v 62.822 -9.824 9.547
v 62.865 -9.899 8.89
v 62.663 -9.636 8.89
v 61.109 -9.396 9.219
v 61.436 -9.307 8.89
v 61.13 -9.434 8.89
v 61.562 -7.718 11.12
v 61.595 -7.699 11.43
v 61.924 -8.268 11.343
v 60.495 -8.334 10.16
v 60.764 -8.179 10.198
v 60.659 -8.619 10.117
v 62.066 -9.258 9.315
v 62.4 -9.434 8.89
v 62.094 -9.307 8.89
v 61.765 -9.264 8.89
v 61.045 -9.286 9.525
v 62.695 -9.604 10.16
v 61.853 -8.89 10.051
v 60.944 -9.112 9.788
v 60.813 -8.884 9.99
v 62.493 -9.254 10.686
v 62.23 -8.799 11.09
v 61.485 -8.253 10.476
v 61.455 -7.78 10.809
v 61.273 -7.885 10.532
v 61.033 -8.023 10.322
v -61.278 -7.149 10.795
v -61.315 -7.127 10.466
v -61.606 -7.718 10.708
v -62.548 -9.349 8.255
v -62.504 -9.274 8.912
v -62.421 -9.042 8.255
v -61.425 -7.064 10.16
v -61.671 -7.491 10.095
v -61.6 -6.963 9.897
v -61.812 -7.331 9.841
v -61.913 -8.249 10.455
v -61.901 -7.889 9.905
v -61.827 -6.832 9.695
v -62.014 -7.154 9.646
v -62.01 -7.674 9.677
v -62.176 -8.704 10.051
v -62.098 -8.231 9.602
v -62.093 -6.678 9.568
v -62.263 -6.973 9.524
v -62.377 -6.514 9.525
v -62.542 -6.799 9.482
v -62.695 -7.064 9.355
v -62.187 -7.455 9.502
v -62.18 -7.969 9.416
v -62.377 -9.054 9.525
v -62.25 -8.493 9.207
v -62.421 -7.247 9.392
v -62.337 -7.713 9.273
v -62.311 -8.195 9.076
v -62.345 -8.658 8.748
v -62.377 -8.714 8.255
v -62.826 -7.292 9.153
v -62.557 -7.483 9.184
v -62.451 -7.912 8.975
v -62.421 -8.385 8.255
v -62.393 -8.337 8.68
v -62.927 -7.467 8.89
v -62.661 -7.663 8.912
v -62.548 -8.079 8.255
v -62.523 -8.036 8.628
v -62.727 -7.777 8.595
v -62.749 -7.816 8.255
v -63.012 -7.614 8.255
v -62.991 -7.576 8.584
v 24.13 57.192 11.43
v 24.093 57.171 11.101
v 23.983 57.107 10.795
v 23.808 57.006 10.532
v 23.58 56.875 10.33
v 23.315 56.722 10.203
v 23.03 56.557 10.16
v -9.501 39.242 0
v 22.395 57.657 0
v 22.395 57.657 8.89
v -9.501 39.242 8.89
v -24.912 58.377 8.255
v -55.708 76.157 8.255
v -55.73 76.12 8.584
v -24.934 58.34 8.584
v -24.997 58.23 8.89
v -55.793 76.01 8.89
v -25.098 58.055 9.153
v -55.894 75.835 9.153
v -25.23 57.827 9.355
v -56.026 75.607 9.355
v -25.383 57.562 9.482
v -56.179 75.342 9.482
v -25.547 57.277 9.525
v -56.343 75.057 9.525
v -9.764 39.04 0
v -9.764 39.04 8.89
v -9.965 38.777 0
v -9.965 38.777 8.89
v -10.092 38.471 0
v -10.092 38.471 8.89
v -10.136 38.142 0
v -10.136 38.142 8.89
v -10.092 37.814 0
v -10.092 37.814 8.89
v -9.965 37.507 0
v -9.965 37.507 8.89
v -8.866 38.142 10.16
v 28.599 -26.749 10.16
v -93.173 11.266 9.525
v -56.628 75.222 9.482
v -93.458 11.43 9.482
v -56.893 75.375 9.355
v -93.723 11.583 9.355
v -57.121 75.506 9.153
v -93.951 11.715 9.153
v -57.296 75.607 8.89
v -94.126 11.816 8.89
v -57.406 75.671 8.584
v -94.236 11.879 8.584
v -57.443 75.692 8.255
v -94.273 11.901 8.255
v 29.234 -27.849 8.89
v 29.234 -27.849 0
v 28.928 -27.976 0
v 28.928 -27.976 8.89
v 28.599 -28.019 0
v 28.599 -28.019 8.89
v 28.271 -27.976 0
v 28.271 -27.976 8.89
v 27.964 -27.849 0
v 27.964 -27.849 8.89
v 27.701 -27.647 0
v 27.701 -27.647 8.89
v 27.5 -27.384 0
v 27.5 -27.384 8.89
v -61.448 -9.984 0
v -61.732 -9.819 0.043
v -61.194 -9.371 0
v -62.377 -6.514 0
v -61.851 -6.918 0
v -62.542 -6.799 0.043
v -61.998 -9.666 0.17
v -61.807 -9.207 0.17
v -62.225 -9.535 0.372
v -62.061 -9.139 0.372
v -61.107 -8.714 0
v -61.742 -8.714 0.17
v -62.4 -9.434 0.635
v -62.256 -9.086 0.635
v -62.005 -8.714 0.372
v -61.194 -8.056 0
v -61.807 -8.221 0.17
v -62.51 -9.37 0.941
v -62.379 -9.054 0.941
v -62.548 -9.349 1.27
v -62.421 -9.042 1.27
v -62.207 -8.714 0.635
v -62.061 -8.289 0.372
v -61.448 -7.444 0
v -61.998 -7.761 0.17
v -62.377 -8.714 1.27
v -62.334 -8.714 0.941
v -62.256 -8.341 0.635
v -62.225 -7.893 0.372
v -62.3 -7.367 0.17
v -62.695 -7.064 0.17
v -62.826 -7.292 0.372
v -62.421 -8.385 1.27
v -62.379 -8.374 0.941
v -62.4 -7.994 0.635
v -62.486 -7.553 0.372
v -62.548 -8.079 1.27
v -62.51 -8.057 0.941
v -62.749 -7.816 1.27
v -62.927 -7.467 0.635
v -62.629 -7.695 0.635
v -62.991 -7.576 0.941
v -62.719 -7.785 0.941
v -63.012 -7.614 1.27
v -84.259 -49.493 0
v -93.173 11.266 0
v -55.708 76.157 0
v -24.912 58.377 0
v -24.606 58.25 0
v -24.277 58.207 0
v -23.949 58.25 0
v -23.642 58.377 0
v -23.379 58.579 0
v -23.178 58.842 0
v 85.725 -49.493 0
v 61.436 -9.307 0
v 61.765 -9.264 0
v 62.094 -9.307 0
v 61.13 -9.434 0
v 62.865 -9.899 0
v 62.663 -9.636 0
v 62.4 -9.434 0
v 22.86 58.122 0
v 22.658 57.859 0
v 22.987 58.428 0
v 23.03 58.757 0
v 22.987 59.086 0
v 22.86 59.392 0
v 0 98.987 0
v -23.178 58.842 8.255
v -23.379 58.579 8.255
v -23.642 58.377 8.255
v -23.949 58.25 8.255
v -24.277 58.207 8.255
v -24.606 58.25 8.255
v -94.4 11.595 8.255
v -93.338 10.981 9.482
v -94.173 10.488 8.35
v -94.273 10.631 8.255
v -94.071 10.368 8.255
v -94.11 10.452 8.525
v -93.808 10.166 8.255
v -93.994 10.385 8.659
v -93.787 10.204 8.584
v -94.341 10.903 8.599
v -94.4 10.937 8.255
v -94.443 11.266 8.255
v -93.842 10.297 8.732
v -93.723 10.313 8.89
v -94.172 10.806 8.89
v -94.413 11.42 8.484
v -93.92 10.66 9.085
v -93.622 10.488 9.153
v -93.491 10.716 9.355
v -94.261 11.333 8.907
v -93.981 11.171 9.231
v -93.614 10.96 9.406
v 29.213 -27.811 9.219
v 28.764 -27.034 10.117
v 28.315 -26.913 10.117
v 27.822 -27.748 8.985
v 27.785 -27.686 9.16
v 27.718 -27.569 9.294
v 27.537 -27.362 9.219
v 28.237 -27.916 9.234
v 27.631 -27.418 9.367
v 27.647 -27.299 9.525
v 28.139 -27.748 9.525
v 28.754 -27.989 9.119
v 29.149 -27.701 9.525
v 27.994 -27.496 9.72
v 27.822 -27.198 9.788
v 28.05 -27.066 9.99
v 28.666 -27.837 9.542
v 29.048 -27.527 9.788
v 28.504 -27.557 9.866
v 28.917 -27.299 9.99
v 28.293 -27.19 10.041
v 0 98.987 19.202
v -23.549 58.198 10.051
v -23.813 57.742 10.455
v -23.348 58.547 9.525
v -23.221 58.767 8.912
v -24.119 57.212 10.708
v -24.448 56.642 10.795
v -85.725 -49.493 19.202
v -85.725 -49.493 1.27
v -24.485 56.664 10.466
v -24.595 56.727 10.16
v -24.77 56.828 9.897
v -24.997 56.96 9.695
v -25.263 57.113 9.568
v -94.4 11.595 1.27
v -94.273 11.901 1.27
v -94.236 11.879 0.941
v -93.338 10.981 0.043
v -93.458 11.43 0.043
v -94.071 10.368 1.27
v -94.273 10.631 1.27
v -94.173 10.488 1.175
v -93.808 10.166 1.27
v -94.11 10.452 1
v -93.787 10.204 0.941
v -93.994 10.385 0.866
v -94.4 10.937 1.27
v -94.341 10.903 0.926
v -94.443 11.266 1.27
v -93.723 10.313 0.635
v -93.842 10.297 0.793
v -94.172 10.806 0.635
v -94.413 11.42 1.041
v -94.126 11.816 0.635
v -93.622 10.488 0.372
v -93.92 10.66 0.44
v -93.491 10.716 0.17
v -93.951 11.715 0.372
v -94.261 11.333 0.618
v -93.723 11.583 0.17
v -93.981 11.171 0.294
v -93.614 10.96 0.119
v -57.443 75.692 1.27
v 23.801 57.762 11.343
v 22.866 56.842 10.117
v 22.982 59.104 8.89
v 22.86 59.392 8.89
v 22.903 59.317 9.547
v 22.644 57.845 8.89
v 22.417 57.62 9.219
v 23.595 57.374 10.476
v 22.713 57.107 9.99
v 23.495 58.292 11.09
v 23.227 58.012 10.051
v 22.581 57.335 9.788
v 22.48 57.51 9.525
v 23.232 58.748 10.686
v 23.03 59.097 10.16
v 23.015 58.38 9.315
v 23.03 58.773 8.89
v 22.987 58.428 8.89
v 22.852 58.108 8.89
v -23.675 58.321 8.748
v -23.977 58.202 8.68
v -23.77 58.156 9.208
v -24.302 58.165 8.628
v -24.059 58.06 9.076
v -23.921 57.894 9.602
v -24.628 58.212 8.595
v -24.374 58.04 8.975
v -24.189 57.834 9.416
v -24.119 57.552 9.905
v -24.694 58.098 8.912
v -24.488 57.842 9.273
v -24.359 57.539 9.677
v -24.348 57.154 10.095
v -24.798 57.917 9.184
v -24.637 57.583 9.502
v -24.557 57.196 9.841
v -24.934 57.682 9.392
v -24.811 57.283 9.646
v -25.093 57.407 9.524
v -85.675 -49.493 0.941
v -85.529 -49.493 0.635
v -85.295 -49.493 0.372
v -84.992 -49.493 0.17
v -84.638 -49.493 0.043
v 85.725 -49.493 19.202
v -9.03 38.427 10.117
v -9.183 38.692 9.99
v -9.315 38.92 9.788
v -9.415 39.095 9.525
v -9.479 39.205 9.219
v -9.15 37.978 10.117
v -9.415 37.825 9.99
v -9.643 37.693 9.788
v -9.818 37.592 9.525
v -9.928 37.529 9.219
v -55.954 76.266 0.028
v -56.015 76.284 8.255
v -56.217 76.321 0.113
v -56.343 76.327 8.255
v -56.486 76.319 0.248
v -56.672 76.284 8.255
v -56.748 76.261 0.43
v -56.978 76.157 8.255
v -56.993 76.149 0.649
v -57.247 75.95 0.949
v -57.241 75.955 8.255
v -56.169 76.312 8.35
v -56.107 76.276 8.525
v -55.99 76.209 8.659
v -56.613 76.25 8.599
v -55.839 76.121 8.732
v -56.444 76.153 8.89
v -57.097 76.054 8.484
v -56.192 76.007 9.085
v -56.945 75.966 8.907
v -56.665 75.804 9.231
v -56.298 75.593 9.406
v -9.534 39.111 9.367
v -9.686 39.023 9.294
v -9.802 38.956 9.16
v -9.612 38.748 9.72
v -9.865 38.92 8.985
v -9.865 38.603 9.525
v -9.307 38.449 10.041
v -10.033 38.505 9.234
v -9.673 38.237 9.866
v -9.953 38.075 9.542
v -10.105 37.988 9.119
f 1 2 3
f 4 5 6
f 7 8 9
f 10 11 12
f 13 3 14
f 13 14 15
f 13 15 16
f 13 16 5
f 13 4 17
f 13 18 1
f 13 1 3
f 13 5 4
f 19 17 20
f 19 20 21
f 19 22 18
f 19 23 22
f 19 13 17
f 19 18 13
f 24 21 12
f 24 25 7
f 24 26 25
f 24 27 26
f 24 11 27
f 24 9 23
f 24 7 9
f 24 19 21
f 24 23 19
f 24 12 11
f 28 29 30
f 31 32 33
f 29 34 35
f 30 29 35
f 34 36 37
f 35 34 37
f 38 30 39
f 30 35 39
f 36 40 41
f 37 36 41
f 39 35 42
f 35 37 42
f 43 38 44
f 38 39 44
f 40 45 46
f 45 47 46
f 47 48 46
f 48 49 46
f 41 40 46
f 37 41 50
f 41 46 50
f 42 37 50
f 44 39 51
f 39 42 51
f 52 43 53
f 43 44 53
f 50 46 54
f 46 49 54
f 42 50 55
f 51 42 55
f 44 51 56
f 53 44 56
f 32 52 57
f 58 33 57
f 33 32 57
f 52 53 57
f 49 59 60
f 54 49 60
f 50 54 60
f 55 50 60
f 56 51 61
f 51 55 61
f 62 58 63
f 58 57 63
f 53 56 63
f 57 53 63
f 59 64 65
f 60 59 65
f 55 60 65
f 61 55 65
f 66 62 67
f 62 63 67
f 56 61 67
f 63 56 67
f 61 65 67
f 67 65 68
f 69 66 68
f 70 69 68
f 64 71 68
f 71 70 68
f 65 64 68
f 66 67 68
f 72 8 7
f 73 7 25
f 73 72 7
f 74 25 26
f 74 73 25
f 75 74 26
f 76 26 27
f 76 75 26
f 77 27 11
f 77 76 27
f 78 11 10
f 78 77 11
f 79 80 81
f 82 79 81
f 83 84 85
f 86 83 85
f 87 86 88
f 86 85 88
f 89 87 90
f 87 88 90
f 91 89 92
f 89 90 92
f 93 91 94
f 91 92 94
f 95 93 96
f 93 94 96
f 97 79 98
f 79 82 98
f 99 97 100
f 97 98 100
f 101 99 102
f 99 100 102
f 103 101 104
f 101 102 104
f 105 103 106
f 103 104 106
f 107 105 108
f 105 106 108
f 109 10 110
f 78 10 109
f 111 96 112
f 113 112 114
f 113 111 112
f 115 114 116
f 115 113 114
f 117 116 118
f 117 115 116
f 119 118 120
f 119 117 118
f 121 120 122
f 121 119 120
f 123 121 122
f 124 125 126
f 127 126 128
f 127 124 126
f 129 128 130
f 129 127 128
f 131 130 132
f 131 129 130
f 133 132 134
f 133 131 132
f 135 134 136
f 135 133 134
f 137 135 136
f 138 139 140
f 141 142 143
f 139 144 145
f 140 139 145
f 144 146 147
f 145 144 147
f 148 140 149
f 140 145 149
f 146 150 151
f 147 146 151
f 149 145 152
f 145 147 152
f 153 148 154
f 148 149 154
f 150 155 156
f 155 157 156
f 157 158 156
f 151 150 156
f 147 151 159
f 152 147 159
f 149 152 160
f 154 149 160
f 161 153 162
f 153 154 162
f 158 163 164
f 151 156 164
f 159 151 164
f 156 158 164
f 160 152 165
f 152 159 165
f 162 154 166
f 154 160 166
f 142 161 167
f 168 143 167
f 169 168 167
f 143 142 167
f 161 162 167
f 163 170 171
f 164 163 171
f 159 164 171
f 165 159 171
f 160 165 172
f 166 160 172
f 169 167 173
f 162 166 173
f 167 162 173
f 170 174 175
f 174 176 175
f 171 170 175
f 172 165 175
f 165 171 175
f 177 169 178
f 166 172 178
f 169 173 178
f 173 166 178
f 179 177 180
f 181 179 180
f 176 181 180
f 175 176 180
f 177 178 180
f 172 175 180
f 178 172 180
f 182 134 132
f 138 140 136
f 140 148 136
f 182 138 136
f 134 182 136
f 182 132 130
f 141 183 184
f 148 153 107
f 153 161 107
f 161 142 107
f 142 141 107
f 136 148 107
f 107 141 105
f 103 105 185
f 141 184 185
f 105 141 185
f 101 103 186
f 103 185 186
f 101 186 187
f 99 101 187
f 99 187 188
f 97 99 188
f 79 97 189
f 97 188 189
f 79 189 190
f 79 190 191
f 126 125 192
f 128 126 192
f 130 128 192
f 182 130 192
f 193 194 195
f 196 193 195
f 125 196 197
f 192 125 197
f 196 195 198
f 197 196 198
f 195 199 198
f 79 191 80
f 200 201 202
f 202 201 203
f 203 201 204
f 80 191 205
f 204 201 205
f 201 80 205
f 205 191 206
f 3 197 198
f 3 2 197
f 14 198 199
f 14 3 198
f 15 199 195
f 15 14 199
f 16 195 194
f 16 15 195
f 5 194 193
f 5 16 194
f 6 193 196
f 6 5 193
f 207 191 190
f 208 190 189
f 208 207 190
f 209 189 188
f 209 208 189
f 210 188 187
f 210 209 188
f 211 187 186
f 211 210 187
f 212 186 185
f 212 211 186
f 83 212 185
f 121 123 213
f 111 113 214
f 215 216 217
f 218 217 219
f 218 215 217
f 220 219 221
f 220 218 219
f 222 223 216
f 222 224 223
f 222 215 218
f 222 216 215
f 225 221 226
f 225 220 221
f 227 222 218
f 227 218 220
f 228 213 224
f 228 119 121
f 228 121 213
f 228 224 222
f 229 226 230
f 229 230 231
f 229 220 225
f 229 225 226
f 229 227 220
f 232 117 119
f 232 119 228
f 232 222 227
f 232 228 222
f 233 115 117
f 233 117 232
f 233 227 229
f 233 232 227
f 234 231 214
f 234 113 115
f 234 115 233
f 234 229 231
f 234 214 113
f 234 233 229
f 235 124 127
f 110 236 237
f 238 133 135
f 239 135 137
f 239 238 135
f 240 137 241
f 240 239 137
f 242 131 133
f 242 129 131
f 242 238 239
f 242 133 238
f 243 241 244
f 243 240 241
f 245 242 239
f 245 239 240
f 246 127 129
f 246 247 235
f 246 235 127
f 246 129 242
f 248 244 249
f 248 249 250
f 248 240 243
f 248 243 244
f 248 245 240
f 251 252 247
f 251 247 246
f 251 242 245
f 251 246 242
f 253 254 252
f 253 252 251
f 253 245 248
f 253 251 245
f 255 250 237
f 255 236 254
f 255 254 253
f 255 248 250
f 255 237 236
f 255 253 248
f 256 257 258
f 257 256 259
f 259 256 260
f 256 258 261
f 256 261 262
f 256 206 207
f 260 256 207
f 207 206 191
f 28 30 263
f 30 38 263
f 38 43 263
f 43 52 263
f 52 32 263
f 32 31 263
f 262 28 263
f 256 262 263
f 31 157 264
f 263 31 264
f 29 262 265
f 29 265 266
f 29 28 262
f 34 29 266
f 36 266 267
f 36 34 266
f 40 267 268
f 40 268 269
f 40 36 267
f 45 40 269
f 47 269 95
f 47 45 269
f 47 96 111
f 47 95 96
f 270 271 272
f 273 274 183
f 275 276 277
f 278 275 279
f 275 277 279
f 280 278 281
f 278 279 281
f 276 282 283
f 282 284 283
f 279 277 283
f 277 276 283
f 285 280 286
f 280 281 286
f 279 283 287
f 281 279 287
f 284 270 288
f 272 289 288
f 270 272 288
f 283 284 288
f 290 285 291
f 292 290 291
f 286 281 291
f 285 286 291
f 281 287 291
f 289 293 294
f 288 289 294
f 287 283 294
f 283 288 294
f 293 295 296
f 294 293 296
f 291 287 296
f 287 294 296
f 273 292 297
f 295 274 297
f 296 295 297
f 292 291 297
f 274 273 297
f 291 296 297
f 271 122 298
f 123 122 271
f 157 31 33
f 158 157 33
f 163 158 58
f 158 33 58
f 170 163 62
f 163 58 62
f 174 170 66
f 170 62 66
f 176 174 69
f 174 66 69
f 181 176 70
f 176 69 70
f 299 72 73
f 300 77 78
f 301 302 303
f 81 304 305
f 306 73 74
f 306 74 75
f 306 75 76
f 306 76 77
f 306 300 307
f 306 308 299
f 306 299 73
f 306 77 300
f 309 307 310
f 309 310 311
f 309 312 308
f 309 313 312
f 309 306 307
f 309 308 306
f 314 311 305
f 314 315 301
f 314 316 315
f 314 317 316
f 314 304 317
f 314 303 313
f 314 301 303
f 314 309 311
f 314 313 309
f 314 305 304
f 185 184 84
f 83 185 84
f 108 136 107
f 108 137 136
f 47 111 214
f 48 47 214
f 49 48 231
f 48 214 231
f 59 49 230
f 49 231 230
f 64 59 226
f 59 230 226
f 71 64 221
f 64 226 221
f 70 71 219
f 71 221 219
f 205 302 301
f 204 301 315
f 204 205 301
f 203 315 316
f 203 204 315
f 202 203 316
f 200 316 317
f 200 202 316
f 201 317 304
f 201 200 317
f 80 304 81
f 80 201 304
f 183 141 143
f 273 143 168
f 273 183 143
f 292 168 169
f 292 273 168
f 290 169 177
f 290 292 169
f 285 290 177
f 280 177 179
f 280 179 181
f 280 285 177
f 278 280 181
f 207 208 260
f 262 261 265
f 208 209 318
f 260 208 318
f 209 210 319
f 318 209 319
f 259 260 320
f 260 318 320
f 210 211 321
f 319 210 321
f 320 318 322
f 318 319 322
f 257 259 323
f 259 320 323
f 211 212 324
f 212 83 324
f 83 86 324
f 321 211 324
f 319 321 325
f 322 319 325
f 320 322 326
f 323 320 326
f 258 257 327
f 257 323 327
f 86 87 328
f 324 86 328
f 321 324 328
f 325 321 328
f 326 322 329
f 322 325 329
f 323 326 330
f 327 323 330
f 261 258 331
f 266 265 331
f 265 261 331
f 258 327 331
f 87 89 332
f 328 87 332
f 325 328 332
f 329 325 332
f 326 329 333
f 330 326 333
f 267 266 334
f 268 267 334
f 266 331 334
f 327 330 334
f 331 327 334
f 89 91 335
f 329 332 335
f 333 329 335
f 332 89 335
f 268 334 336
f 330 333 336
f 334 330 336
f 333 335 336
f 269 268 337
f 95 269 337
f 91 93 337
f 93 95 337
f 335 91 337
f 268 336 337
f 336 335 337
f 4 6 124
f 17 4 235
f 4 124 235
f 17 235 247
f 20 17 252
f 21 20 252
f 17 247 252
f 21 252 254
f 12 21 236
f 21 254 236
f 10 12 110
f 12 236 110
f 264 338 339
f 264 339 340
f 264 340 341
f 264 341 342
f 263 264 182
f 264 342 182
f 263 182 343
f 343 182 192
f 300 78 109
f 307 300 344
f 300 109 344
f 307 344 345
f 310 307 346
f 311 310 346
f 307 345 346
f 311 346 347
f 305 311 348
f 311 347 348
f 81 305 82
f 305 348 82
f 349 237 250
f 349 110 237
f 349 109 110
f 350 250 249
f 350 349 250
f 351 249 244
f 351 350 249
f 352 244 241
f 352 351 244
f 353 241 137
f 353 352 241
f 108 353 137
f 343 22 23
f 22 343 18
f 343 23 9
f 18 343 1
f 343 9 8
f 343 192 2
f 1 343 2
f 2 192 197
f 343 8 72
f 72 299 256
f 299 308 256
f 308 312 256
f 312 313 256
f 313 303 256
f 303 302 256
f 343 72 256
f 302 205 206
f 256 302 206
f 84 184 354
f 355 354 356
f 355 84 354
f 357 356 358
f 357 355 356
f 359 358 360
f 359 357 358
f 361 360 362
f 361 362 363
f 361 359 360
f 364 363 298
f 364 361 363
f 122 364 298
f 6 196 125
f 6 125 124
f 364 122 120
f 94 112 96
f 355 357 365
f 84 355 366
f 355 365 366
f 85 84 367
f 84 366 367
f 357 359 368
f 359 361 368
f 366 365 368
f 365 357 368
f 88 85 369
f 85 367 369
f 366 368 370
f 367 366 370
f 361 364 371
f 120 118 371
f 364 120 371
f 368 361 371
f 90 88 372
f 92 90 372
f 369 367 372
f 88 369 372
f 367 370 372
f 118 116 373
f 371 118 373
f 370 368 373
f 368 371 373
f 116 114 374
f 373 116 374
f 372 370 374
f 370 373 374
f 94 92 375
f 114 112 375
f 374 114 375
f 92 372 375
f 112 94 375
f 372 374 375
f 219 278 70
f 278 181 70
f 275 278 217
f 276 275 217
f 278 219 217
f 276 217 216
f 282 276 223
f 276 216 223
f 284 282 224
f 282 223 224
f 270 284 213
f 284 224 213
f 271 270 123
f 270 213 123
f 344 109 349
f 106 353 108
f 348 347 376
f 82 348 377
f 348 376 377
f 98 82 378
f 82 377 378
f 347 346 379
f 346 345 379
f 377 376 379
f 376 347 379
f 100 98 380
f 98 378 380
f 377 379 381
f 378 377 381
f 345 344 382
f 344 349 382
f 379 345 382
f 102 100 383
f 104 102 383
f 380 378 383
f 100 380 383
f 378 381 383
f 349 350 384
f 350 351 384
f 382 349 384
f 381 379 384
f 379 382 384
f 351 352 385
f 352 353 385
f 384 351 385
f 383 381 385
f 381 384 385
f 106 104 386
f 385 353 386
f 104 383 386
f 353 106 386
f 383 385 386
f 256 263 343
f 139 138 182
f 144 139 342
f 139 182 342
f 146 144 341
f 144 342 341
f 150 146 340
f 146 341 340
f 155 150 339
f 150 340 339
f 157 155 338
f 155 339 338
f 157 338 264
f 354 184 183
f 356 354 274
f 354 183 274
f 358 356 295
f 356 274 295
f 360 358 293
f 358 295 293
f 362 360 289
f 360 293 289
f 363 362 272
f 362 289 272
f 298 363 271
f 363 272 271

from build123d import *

# Parameters (mm, degrees)
F1_DEPTH = 19.2024
F2_W     = 77.47
F2_H     = 10.16
F3_DEPTH = 39.37
F4_F1_R  = 1.27
F4_F2_R  = 1.27
F5_W     = 76.2
F5_H     = 9.525
F6_DEPTH = 38.1
F7_R     = 1.27


with BuildPart() as f1:
    # F0 (on Top) → F1 (new body)
    with BuildSketch(Plane.XY):
        Polygon((-85.725, -49.4933518263), (85.725, -49.4933518263), (0, 98.9867036526), align=None)
    extrude(amount=F1_DEPTH)

    # F2 (on face) → F3 (cut)
    with BuildSketch(Plane(origin=(42.8625, 24.7466759131, 0), x_dir=(-0.5, 0.8660254038, 0), z_dir=(0.8660254038, 0.5, 0))):
        with Locations((0, 5.08)):
            Rectangle(F2_W, F2_H)
    extrude(amount=-F3_DEPTH, mode=Mode.SUBTRACT)

    # F4: fillet of radius 1.27 on 6 edges, made by hand

    # F4_f1
    f4_f1_edges = [f1.edges().sort_by_distance(p)[0] for p in [
        (45.1822899265, -18.6413181024, 10.16),
        (28.134579853, -28.4838181024, 5.08),
        (8.767079853, 5.0616759131, 10.16),
        (6.4472899265, 48.4496699287, 10.16),
        (-10.600420147, 38.6071699287, 5.08),
    ]]
    fillet(f4_f1_edges, radius=F4_F1_R)

    # F4_f2
    f4_f2_edges = [f1.edges().sort_by_distance(p)[0] for p in [
        (62.23, -8.7988181024, 4.445),
        (62.0440128061, -8.476678833, 9.7880256121),
    ]]
    fillet(f4_f2_edges, radius=F4_F2_R)

    # F5 (on face) → F6 (join)
    with BuildSketch(Plane(origin=(-42.8625, 24.7466759131, 0), x_dir=(-0.5, -0.8660254038, 0), z_dir=(-0.8660254038, 0.5, 0))):
        with Locations((0, 4.7625)):
            Rectangle(F5_W, F5_H)
    extrude(amount=F6_DEPTH)

    # F7
    f7_edges = [f1.edges().sort_by_distance(p)[0] for p in [
        (-75.858068, 43.796676, 9.525),
        (-56.808068, 76.792244, 4.7625),
        (-75.858068, 43.796676, 0),
        (-94.908068, 10.801108, 4.7625),
        (-40.310284, 67.267244, 9.525),
        (-78.410284, 1.276108, 0),
        (-23.8125, 57.742244, 4.7625),
        (-61.9125, -8.248892, 4.7625),
        (-78.410284, 1.276108, 9.525),
        (-73.81875, -28.871122, 0),
        (-42.8625, 24.746676, 9.525),
    ]]
    fillet(f7_edges, radius=F7_R)


solid = f1.part
